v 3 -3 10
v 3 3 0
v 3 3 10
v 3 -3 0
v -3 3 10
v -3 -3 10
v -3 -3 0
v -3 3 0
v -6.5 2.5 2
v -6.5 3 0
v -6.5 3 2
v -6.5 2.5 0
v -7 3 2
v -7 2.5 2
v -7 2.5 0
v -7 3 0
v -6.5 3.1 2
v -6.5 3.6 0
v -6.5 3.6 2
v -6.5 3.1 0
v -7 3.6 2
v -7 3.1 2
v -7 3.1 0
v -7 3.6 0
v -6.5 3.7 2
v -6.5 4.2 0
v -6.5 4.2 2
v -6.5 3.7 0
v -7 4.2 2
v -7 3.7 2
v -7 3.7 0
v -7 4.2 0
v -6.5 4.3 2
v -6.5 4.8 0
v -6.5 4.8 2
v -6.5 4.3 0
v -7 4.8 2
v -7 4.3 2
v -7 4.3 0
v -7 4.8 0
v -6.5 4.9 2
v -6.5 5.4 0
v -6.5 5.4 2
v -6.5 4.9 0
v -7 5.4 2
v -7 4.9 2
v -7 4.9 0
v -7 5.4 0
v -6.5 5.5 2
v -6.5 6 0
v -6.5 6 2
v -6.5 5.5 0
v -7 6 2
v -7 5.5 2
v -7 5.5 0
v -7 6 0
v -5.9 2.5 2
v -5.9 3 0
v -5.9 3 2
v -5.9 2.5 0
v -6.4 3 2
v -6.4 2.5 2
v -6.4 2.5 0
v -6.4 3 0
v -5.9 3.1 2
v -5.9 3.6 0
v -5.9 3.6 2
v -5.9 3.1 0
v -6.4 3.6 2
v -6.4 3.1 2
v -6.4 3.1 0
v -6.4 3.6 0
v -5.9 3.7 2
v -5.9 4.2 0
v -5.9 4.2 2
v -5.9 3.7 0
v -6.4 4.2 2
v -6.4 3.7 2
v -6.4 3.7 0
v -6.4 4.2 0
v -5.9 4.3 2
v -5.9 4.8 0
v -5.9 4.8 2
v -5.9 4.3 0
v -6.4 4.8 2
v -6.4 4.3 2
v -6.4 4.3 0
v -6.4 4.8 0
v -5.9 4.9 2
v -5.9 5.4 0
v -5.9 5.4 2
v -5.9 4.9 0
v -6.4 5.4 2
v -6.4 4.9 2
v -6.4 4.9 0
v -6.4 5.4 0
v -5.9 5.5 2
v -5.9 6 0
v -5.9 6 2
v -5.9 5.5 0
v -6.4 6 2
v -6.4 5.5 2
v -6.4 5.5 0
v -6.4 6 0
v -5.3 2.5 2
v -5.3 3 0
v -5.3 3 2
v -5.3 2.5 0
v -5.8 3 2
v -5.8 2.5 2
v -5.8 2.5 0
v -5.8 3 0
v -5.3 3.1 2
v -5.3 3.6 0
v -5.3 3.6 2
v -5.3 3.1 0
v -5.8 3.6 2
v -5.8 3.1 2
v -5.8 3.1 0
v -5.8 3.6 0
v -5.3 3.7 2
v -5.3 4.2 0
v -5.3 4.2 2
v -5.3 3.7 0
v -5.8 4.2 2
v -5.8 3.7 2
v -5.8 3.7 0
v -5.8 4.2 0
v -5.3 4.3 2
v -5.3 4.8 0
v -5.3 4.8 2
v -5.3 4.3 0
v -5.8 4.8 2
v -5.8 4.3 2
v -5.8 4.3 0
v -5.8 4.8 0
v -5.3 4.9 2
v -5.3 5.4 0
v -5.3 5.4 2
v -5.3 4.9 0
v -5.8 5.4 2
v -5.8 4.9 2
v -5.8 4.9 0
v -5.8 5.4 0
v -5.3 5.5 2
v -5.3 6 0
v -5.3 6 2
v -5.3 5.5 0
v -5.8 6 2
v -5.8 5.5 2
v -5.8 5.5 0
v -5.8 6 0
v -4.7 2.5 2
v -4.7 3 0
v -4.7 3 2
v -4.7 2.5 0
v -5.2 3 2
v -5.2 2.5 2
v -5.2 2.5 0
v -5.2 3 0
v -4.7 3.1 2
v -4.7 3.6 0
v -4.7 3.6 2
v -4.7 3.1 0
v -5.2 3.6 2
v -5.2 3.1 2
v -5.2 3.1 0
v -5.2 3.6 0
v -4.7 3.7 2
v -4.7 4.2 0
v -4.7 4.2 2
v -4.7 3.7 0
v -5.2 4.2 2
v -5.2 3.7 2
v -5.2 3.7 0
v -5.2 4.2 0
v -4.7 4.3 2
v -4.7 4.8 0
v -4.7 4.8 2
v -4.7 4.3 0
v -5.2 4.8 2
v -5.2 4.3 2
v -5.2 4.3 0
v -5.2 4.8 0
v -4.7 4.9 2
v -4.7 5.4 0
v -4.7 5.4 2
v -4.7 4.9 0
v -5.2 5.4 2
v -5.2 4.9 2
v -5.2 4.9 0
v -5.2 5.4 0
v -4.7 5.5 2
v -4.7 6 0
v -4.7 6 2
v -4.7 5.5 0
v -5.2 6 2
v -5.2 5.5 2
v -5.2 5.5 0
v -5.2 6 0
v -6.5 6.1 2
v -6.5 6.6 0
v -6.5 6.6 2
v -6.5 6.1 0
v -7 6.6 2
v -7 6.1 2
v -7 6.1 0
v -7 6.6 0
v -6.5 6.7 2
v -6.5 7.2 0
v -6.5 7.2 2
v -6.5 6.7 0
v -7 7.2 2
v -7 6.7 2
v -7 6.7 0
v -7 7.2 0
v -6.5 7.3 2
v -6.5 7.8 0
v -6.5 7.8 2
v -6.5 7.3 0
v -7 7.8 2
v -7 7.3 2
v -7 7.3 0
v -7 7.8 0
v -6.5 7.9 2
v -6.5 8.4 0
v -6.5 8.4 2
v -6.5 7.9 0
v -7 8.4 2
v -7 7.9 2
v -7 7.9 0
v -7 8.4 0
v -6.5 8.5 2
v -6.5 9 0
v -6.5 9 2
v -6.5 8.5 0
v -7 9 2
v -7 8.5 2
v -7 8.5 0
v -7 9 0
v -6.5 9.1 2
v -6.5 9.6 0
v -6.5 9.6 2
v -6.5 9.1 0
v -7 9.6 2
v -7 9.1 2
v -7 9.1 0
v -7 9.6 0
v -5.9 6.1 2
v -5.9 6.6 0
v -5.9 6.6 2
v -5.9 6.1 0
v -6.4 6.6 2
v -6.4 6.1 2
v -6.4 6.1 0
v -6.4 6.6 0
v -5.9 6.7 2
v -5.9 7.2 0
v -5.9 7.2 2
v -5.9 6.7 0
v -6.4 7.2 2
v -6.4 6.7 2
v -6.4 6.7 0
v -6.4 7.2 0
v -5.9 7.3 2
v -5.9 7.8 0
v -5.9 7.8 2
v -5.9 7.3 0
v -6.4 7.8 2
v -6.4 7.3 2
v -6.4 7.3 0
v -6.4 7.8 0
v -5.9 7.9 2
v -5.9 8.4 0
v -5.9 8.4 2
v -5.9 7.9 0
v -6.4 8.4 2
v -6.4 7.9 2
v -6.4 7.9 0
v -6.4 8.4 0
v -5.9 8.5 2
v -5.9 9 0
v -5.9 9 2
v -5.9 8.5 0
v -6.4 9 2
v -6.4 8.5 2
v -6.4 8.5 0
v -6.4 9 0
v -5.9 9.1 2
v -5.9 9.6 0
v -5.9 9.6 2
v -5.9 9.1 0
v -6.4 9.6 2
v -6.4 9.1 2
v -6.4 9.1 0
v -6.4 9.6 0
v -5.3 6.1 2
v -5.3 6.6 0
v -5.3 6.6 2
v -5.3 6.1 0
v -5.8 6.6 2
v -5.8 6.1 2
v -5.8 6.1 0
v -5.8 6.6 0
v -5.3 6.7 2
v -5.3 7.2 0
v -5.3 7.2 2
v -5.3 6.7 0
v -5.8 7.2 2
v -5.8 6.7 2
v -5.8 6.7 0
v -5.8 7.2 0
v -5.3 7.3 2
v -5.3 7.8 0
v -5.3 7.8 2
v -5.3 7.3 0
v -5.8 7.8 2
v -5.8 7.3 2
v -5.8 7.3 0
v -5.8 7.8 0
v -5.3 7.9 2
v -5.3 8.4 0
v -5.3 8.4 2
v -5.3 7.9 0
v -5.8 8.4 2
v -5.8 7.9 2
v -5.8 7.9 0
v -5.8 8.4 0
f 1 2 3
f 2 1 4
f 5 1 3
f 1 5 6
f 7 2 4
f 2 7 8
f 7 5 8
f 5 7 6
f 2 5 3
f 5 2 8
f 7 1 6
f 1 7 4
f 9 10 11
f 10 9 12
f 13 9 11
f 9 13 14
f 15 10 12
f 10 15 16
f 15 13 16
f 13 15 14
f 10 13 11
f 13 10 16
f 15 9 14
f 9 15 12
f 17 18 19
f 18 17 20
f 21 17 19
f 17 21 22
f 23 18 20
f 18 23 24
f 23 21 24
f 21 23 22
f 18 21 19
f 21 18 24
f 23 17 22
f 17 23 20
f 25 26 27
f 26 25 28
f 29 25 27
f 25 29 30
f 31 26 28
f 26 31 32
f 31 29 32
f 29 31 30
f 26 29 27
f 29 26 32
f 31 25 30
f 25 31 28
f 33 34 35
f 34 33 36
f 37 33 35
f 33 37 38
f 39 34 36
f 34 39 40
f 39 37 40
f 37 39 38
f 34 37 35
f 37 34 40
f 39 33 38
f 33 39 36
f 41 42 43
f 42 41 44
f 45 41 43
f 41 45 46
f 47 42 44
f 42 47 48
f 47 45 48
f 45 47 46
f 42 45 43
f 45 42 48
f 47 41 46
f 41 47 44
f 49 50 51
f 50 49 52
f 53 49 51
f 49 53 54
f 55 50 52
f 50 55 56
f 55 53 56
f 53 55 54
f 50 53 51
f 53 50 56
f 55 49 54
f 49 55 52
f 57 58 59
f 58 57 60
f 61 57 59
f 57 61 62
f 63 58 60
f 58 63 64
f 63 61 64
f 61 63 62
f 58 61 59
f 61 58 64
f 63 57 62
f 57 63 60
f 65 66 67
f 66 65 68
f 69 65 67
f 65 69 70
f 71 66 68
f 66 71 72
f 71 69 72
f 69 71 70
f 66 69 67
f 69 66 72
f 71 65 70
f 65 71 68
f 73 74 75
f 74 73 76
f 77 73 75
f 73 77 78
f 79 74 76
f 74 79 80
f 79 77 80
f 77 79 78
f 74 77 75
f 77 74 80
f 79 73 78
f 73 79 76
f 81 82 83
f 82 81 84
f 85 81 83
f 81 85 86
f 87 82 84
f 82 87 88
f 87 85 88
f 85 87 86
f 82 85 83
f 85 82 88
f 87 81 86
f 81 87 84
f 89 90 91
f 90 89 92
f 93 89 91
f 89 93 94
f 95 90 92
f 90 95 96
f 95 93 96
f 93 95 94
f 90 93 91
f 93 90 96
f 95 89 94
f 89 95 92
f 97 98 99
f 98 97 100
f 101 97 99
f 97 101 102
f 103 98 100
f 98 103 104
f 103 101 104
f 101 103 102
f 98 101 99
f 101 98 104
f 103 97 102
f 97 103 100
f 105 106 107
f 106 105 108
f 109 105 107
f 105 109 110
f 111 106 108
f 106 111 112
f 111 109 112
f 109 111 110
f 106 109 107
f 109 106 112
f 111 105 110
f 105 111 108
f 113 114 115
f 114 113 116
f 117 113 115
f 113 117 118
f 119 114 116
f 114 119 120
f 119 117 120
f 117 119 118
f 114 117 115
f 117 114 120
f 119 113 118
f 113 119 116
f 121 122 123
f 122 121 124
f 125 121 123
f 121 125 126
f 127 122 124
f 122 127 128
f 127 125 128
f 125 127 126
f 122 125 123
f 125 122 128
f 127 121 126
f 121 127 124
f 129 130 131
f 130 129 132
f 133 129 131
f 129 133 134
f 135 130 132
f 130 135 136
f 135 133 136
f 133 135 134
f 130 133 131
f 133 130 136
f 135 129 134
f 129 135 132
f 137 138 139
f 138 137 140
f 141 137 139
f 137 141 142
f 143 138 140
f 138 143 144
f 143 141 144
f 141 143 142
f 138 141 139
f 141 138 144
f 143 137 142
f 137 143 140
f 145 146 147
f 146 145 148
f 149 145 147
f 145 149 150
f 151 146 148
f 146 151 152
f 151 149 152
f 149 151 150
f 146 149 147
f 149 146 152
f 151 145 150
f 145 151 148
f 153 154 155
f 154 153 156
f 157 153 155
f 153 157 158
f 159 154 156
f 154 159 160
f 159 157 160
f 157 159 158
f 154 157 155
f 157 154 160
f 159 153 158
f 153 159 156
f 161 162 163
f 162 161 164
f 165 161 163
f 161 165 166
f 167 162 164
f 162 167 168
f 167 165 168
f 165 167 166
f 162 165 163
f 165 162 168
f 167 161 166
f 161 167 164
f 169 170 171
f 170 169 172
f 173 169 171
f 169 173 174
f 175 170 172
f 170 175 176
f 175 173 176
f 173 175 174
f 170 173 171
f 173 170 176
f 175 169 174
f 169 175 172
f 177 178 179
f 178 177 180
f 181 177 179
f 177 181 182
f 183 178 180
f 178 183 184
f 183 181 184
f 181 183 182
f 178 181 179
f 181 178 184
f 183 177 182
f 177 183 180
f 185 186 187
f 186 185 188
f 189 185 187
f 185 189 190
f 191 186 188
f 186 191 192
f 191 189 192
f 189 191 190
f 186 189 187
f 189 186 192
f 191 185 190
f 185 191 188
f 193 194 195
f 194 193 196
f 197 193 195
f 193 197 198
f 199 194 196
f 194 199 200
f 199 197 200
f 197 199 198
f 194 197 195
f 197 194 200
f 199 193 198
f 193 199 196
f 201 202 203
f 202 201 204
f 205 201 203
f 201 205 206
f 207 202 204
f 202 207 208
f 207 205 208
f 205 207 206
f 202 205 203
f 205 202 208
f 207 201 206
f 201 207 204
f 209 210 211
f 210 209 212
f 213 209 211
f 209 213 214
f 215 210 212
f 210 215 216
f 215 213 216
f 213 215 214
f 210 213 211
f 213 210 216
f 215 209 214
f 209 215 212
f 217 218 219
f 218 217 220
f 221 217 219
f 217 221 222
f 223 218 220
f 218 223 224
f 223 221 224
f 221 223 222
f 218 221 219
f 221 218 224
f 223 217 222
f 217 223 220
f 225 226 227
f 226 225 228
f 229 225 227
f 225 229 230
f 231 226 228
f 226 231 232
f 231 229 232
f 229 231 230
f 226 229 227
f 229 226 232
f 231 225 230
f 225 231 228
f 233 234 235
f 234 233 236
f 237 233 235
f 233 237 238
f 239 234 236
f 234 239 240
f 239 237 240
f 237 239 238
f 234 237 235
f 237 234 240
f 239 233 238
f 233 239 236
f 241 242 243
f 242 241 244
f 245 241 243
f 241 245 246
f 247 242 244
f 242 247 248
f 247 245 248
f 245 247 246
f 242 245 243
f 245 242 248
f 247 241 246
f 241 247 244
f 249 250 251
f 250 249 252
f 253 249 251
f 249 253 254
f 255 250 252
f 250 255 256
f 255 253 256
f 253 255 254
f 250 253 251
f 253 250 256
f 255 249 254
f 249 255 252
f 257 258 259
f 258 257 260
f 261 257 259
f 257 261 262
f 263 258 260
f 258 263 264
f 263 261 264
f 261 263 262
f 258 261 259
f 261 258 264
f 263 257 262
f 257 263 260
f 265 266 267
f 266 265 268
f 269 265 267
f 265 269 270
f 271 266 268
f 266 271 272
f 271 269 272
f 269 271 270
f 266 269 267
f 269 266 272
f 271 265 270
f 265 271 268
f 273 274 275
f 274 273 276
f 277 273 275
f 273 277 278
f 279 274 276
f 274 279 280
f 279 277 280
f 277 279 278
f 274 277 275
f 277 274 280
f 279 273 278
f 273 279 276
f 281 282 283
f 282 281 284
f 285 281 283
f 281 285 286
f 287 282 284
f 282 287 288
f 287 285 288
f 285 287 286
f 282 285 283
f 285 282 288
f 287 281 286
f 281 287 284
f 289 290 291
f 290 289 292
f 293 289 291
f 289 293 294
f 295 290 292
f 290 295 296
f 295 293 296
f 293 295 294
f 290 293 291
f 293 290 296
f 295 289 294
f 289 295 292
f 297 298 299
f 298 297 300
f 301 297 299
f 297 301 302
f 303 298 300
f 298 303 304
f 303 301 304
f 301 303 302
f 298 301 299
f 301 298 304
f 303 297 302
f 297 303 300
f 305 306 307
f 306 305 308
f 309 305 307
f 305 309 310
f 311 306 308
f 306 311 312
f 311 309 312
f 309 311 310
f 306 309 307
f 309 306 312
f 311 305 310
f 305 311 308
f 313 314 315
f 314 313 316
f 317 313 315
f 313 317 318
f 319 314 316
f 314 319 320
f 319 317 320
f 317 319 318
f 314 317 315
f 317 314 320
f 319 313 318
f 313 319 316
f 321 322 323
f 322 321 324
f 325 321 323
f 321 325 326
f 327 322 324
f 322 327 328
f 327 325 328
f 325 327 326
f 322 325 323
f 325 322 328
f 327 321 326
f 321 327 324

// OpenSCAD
translate([0, 0, 5]) color([0,1,0,0.9]) cube([6, 6, 10], center=true);
translate([-6.75, 2.75, 1]) color([1,0,0]) cube([0.5, 0.5, 2], center=true);
translate([-6.75, 3.35, 1]) color([1,0,0]) cube([0.5, 0.5, 2], center=true);
translate([-6.75, 3.95, 1]) color([1,0,0]) cube([0.5, 0.5, 2], center=true);
translate([-6.75, 4.55, 1]) color([1,0,0]) cube([0.5, 0.5, 2], center=true);
translate([-6.75, 5.15, 1]) color([1,0,0]) cube([0.5, 0.5, 2], center=true);
translate([-6.75, 5.75, 1]) color([1,0,0]) cube([0.5, 0.5, 2], center=true);
translate([-6.15, 2.75, 1]) color([1,0,0]) cube([0.5, 0.5, 2], center=true);
translate([-6.15, 3.35, 1]) color([1,0,0]) cube([0.5, 0.5, 2], center=true);
translate([-6.15, 3.95, 1]) color([1,0,0]) cube([0.5, 0.5, 2], center=true);
translate([-6.15, 4.55, 1]) color([1,0,0]) cube([0.5, 0.5, 2], center=true);
translate([-6.15, 5.15, 1]) color([1,0,0]) cube([0.5, 0.5, 2], center=true);
translate([-6.15, 5.75, 1]) color([1,0,0]) cube([0.5, 0.5, 2], center=true);
translate([-5.55, 2.75, 1]) color([1,0,0]) cube([0.5, 0.5, 2], center=true);
translate([-5.55, 3.35, 1]) color([1,0,0]) cube([0.5, 0.5, 2], center=true);
translate([-5.55, 3.95, 1]) color([1,0,0]) cube([0.5, 0.5, 2], center=true);
translate([-5.55, 4.55, 1]) color([1,0,0]) cube([0.5, 0.5, 2], center=true);
translate([-5.55, 5.15, 1]) color([1,0,0]) cube([0.5, 0.5, 2], center=true);
translate([-5.55, 5.75, 1]) color([1,0,0]) cube([0.5, 0.5, 2], center=true);
translate([-4.95, 2.75, 1]) color([1,0,0]) cube([0.5, 0.5, 2], center=true);
translate([-4.95, 3.35, 1]) color([1,0,0]) cube([0.5, 0.5, 2], center=true);
translate([-4.95, 3.95, 1]) color([1,0,0]) cube([0.5, 0.5, 2], center=true);
translate([-4.95, 4.55, 1]) color([1,0,0]) cube([0.5, 0.5, 2], center=true);
translate([-4.95, 5.15, 1]) color([1,0,0]) cube([0.5, 0.5, 2], center=true);
translate([-4.95, 5.75, 1]) color([1,0,0]) cube([0.5, 0.5, 2], center=true);
translate([-6.75, 6.35, 1]) color([1,0,0]) cube([0.5, 0.5, 2], center=true);
translate([-6.75, 6.95, 1]) color([1,0,0]) cube([0.5, 0.5, 2], center=true);
translate([-6.75, 7.55, 1]) color([1,0,0]) cube([0.5, 0.5, 2], center=true);
translate([-6.75, 8.15, 1]) color([1,0,0]) cube([0.5, 0.5, 2], center=true);
translate([-6.75, 8.75, 1]) color([1,0,0]) cube([0.5, 0.5, 2], center=true);
translate([-6.75, 9.35, 1]) color([1,0,0]) cube([0.5, 0.5, 2], center=true);
translate([-6.15, 6.35, 1]) color([1,0,0]) cube([0.5, 0.5, 2], center=true);
translate([-6.15, 6.95, 1]) color([1,0,0]) cube([0.5, 0.5, 2], center=true);
translate([-6.15, 7.55, 1]) color([1,0,0]) cube([0.5, 0.5, 2], center=true);
translate([-6.15, 8.15, 1]) color([1,0,0]) cube([0.5, 0.5, 2], center=true);
translate([-6.15, 8.75, 1]) color([1,0,0]) cube([0.5, 0.5, 2], center=true);
translate([-6.15, 9.35, 1]) color([1,0,0]) cube([0.5, 0.5, 2], center=true);
translate([-5.55, 6.35, 1]) color([1,0,0]) cube([0.5, 0.5, 2], center=true);
translate([-5.55, 6.95, 1]) color([1,0,0]) cube([0.5, 0.5, 2], center=true);
translate([-5.55, 7.55, 1]) color([1,0,0]) cube([0.5, 0.5, 2], center=true);
translate([-5.55, 8.15, 1]) color([1,0,0]) cube([0.5, 0.5, 2], center=true);
